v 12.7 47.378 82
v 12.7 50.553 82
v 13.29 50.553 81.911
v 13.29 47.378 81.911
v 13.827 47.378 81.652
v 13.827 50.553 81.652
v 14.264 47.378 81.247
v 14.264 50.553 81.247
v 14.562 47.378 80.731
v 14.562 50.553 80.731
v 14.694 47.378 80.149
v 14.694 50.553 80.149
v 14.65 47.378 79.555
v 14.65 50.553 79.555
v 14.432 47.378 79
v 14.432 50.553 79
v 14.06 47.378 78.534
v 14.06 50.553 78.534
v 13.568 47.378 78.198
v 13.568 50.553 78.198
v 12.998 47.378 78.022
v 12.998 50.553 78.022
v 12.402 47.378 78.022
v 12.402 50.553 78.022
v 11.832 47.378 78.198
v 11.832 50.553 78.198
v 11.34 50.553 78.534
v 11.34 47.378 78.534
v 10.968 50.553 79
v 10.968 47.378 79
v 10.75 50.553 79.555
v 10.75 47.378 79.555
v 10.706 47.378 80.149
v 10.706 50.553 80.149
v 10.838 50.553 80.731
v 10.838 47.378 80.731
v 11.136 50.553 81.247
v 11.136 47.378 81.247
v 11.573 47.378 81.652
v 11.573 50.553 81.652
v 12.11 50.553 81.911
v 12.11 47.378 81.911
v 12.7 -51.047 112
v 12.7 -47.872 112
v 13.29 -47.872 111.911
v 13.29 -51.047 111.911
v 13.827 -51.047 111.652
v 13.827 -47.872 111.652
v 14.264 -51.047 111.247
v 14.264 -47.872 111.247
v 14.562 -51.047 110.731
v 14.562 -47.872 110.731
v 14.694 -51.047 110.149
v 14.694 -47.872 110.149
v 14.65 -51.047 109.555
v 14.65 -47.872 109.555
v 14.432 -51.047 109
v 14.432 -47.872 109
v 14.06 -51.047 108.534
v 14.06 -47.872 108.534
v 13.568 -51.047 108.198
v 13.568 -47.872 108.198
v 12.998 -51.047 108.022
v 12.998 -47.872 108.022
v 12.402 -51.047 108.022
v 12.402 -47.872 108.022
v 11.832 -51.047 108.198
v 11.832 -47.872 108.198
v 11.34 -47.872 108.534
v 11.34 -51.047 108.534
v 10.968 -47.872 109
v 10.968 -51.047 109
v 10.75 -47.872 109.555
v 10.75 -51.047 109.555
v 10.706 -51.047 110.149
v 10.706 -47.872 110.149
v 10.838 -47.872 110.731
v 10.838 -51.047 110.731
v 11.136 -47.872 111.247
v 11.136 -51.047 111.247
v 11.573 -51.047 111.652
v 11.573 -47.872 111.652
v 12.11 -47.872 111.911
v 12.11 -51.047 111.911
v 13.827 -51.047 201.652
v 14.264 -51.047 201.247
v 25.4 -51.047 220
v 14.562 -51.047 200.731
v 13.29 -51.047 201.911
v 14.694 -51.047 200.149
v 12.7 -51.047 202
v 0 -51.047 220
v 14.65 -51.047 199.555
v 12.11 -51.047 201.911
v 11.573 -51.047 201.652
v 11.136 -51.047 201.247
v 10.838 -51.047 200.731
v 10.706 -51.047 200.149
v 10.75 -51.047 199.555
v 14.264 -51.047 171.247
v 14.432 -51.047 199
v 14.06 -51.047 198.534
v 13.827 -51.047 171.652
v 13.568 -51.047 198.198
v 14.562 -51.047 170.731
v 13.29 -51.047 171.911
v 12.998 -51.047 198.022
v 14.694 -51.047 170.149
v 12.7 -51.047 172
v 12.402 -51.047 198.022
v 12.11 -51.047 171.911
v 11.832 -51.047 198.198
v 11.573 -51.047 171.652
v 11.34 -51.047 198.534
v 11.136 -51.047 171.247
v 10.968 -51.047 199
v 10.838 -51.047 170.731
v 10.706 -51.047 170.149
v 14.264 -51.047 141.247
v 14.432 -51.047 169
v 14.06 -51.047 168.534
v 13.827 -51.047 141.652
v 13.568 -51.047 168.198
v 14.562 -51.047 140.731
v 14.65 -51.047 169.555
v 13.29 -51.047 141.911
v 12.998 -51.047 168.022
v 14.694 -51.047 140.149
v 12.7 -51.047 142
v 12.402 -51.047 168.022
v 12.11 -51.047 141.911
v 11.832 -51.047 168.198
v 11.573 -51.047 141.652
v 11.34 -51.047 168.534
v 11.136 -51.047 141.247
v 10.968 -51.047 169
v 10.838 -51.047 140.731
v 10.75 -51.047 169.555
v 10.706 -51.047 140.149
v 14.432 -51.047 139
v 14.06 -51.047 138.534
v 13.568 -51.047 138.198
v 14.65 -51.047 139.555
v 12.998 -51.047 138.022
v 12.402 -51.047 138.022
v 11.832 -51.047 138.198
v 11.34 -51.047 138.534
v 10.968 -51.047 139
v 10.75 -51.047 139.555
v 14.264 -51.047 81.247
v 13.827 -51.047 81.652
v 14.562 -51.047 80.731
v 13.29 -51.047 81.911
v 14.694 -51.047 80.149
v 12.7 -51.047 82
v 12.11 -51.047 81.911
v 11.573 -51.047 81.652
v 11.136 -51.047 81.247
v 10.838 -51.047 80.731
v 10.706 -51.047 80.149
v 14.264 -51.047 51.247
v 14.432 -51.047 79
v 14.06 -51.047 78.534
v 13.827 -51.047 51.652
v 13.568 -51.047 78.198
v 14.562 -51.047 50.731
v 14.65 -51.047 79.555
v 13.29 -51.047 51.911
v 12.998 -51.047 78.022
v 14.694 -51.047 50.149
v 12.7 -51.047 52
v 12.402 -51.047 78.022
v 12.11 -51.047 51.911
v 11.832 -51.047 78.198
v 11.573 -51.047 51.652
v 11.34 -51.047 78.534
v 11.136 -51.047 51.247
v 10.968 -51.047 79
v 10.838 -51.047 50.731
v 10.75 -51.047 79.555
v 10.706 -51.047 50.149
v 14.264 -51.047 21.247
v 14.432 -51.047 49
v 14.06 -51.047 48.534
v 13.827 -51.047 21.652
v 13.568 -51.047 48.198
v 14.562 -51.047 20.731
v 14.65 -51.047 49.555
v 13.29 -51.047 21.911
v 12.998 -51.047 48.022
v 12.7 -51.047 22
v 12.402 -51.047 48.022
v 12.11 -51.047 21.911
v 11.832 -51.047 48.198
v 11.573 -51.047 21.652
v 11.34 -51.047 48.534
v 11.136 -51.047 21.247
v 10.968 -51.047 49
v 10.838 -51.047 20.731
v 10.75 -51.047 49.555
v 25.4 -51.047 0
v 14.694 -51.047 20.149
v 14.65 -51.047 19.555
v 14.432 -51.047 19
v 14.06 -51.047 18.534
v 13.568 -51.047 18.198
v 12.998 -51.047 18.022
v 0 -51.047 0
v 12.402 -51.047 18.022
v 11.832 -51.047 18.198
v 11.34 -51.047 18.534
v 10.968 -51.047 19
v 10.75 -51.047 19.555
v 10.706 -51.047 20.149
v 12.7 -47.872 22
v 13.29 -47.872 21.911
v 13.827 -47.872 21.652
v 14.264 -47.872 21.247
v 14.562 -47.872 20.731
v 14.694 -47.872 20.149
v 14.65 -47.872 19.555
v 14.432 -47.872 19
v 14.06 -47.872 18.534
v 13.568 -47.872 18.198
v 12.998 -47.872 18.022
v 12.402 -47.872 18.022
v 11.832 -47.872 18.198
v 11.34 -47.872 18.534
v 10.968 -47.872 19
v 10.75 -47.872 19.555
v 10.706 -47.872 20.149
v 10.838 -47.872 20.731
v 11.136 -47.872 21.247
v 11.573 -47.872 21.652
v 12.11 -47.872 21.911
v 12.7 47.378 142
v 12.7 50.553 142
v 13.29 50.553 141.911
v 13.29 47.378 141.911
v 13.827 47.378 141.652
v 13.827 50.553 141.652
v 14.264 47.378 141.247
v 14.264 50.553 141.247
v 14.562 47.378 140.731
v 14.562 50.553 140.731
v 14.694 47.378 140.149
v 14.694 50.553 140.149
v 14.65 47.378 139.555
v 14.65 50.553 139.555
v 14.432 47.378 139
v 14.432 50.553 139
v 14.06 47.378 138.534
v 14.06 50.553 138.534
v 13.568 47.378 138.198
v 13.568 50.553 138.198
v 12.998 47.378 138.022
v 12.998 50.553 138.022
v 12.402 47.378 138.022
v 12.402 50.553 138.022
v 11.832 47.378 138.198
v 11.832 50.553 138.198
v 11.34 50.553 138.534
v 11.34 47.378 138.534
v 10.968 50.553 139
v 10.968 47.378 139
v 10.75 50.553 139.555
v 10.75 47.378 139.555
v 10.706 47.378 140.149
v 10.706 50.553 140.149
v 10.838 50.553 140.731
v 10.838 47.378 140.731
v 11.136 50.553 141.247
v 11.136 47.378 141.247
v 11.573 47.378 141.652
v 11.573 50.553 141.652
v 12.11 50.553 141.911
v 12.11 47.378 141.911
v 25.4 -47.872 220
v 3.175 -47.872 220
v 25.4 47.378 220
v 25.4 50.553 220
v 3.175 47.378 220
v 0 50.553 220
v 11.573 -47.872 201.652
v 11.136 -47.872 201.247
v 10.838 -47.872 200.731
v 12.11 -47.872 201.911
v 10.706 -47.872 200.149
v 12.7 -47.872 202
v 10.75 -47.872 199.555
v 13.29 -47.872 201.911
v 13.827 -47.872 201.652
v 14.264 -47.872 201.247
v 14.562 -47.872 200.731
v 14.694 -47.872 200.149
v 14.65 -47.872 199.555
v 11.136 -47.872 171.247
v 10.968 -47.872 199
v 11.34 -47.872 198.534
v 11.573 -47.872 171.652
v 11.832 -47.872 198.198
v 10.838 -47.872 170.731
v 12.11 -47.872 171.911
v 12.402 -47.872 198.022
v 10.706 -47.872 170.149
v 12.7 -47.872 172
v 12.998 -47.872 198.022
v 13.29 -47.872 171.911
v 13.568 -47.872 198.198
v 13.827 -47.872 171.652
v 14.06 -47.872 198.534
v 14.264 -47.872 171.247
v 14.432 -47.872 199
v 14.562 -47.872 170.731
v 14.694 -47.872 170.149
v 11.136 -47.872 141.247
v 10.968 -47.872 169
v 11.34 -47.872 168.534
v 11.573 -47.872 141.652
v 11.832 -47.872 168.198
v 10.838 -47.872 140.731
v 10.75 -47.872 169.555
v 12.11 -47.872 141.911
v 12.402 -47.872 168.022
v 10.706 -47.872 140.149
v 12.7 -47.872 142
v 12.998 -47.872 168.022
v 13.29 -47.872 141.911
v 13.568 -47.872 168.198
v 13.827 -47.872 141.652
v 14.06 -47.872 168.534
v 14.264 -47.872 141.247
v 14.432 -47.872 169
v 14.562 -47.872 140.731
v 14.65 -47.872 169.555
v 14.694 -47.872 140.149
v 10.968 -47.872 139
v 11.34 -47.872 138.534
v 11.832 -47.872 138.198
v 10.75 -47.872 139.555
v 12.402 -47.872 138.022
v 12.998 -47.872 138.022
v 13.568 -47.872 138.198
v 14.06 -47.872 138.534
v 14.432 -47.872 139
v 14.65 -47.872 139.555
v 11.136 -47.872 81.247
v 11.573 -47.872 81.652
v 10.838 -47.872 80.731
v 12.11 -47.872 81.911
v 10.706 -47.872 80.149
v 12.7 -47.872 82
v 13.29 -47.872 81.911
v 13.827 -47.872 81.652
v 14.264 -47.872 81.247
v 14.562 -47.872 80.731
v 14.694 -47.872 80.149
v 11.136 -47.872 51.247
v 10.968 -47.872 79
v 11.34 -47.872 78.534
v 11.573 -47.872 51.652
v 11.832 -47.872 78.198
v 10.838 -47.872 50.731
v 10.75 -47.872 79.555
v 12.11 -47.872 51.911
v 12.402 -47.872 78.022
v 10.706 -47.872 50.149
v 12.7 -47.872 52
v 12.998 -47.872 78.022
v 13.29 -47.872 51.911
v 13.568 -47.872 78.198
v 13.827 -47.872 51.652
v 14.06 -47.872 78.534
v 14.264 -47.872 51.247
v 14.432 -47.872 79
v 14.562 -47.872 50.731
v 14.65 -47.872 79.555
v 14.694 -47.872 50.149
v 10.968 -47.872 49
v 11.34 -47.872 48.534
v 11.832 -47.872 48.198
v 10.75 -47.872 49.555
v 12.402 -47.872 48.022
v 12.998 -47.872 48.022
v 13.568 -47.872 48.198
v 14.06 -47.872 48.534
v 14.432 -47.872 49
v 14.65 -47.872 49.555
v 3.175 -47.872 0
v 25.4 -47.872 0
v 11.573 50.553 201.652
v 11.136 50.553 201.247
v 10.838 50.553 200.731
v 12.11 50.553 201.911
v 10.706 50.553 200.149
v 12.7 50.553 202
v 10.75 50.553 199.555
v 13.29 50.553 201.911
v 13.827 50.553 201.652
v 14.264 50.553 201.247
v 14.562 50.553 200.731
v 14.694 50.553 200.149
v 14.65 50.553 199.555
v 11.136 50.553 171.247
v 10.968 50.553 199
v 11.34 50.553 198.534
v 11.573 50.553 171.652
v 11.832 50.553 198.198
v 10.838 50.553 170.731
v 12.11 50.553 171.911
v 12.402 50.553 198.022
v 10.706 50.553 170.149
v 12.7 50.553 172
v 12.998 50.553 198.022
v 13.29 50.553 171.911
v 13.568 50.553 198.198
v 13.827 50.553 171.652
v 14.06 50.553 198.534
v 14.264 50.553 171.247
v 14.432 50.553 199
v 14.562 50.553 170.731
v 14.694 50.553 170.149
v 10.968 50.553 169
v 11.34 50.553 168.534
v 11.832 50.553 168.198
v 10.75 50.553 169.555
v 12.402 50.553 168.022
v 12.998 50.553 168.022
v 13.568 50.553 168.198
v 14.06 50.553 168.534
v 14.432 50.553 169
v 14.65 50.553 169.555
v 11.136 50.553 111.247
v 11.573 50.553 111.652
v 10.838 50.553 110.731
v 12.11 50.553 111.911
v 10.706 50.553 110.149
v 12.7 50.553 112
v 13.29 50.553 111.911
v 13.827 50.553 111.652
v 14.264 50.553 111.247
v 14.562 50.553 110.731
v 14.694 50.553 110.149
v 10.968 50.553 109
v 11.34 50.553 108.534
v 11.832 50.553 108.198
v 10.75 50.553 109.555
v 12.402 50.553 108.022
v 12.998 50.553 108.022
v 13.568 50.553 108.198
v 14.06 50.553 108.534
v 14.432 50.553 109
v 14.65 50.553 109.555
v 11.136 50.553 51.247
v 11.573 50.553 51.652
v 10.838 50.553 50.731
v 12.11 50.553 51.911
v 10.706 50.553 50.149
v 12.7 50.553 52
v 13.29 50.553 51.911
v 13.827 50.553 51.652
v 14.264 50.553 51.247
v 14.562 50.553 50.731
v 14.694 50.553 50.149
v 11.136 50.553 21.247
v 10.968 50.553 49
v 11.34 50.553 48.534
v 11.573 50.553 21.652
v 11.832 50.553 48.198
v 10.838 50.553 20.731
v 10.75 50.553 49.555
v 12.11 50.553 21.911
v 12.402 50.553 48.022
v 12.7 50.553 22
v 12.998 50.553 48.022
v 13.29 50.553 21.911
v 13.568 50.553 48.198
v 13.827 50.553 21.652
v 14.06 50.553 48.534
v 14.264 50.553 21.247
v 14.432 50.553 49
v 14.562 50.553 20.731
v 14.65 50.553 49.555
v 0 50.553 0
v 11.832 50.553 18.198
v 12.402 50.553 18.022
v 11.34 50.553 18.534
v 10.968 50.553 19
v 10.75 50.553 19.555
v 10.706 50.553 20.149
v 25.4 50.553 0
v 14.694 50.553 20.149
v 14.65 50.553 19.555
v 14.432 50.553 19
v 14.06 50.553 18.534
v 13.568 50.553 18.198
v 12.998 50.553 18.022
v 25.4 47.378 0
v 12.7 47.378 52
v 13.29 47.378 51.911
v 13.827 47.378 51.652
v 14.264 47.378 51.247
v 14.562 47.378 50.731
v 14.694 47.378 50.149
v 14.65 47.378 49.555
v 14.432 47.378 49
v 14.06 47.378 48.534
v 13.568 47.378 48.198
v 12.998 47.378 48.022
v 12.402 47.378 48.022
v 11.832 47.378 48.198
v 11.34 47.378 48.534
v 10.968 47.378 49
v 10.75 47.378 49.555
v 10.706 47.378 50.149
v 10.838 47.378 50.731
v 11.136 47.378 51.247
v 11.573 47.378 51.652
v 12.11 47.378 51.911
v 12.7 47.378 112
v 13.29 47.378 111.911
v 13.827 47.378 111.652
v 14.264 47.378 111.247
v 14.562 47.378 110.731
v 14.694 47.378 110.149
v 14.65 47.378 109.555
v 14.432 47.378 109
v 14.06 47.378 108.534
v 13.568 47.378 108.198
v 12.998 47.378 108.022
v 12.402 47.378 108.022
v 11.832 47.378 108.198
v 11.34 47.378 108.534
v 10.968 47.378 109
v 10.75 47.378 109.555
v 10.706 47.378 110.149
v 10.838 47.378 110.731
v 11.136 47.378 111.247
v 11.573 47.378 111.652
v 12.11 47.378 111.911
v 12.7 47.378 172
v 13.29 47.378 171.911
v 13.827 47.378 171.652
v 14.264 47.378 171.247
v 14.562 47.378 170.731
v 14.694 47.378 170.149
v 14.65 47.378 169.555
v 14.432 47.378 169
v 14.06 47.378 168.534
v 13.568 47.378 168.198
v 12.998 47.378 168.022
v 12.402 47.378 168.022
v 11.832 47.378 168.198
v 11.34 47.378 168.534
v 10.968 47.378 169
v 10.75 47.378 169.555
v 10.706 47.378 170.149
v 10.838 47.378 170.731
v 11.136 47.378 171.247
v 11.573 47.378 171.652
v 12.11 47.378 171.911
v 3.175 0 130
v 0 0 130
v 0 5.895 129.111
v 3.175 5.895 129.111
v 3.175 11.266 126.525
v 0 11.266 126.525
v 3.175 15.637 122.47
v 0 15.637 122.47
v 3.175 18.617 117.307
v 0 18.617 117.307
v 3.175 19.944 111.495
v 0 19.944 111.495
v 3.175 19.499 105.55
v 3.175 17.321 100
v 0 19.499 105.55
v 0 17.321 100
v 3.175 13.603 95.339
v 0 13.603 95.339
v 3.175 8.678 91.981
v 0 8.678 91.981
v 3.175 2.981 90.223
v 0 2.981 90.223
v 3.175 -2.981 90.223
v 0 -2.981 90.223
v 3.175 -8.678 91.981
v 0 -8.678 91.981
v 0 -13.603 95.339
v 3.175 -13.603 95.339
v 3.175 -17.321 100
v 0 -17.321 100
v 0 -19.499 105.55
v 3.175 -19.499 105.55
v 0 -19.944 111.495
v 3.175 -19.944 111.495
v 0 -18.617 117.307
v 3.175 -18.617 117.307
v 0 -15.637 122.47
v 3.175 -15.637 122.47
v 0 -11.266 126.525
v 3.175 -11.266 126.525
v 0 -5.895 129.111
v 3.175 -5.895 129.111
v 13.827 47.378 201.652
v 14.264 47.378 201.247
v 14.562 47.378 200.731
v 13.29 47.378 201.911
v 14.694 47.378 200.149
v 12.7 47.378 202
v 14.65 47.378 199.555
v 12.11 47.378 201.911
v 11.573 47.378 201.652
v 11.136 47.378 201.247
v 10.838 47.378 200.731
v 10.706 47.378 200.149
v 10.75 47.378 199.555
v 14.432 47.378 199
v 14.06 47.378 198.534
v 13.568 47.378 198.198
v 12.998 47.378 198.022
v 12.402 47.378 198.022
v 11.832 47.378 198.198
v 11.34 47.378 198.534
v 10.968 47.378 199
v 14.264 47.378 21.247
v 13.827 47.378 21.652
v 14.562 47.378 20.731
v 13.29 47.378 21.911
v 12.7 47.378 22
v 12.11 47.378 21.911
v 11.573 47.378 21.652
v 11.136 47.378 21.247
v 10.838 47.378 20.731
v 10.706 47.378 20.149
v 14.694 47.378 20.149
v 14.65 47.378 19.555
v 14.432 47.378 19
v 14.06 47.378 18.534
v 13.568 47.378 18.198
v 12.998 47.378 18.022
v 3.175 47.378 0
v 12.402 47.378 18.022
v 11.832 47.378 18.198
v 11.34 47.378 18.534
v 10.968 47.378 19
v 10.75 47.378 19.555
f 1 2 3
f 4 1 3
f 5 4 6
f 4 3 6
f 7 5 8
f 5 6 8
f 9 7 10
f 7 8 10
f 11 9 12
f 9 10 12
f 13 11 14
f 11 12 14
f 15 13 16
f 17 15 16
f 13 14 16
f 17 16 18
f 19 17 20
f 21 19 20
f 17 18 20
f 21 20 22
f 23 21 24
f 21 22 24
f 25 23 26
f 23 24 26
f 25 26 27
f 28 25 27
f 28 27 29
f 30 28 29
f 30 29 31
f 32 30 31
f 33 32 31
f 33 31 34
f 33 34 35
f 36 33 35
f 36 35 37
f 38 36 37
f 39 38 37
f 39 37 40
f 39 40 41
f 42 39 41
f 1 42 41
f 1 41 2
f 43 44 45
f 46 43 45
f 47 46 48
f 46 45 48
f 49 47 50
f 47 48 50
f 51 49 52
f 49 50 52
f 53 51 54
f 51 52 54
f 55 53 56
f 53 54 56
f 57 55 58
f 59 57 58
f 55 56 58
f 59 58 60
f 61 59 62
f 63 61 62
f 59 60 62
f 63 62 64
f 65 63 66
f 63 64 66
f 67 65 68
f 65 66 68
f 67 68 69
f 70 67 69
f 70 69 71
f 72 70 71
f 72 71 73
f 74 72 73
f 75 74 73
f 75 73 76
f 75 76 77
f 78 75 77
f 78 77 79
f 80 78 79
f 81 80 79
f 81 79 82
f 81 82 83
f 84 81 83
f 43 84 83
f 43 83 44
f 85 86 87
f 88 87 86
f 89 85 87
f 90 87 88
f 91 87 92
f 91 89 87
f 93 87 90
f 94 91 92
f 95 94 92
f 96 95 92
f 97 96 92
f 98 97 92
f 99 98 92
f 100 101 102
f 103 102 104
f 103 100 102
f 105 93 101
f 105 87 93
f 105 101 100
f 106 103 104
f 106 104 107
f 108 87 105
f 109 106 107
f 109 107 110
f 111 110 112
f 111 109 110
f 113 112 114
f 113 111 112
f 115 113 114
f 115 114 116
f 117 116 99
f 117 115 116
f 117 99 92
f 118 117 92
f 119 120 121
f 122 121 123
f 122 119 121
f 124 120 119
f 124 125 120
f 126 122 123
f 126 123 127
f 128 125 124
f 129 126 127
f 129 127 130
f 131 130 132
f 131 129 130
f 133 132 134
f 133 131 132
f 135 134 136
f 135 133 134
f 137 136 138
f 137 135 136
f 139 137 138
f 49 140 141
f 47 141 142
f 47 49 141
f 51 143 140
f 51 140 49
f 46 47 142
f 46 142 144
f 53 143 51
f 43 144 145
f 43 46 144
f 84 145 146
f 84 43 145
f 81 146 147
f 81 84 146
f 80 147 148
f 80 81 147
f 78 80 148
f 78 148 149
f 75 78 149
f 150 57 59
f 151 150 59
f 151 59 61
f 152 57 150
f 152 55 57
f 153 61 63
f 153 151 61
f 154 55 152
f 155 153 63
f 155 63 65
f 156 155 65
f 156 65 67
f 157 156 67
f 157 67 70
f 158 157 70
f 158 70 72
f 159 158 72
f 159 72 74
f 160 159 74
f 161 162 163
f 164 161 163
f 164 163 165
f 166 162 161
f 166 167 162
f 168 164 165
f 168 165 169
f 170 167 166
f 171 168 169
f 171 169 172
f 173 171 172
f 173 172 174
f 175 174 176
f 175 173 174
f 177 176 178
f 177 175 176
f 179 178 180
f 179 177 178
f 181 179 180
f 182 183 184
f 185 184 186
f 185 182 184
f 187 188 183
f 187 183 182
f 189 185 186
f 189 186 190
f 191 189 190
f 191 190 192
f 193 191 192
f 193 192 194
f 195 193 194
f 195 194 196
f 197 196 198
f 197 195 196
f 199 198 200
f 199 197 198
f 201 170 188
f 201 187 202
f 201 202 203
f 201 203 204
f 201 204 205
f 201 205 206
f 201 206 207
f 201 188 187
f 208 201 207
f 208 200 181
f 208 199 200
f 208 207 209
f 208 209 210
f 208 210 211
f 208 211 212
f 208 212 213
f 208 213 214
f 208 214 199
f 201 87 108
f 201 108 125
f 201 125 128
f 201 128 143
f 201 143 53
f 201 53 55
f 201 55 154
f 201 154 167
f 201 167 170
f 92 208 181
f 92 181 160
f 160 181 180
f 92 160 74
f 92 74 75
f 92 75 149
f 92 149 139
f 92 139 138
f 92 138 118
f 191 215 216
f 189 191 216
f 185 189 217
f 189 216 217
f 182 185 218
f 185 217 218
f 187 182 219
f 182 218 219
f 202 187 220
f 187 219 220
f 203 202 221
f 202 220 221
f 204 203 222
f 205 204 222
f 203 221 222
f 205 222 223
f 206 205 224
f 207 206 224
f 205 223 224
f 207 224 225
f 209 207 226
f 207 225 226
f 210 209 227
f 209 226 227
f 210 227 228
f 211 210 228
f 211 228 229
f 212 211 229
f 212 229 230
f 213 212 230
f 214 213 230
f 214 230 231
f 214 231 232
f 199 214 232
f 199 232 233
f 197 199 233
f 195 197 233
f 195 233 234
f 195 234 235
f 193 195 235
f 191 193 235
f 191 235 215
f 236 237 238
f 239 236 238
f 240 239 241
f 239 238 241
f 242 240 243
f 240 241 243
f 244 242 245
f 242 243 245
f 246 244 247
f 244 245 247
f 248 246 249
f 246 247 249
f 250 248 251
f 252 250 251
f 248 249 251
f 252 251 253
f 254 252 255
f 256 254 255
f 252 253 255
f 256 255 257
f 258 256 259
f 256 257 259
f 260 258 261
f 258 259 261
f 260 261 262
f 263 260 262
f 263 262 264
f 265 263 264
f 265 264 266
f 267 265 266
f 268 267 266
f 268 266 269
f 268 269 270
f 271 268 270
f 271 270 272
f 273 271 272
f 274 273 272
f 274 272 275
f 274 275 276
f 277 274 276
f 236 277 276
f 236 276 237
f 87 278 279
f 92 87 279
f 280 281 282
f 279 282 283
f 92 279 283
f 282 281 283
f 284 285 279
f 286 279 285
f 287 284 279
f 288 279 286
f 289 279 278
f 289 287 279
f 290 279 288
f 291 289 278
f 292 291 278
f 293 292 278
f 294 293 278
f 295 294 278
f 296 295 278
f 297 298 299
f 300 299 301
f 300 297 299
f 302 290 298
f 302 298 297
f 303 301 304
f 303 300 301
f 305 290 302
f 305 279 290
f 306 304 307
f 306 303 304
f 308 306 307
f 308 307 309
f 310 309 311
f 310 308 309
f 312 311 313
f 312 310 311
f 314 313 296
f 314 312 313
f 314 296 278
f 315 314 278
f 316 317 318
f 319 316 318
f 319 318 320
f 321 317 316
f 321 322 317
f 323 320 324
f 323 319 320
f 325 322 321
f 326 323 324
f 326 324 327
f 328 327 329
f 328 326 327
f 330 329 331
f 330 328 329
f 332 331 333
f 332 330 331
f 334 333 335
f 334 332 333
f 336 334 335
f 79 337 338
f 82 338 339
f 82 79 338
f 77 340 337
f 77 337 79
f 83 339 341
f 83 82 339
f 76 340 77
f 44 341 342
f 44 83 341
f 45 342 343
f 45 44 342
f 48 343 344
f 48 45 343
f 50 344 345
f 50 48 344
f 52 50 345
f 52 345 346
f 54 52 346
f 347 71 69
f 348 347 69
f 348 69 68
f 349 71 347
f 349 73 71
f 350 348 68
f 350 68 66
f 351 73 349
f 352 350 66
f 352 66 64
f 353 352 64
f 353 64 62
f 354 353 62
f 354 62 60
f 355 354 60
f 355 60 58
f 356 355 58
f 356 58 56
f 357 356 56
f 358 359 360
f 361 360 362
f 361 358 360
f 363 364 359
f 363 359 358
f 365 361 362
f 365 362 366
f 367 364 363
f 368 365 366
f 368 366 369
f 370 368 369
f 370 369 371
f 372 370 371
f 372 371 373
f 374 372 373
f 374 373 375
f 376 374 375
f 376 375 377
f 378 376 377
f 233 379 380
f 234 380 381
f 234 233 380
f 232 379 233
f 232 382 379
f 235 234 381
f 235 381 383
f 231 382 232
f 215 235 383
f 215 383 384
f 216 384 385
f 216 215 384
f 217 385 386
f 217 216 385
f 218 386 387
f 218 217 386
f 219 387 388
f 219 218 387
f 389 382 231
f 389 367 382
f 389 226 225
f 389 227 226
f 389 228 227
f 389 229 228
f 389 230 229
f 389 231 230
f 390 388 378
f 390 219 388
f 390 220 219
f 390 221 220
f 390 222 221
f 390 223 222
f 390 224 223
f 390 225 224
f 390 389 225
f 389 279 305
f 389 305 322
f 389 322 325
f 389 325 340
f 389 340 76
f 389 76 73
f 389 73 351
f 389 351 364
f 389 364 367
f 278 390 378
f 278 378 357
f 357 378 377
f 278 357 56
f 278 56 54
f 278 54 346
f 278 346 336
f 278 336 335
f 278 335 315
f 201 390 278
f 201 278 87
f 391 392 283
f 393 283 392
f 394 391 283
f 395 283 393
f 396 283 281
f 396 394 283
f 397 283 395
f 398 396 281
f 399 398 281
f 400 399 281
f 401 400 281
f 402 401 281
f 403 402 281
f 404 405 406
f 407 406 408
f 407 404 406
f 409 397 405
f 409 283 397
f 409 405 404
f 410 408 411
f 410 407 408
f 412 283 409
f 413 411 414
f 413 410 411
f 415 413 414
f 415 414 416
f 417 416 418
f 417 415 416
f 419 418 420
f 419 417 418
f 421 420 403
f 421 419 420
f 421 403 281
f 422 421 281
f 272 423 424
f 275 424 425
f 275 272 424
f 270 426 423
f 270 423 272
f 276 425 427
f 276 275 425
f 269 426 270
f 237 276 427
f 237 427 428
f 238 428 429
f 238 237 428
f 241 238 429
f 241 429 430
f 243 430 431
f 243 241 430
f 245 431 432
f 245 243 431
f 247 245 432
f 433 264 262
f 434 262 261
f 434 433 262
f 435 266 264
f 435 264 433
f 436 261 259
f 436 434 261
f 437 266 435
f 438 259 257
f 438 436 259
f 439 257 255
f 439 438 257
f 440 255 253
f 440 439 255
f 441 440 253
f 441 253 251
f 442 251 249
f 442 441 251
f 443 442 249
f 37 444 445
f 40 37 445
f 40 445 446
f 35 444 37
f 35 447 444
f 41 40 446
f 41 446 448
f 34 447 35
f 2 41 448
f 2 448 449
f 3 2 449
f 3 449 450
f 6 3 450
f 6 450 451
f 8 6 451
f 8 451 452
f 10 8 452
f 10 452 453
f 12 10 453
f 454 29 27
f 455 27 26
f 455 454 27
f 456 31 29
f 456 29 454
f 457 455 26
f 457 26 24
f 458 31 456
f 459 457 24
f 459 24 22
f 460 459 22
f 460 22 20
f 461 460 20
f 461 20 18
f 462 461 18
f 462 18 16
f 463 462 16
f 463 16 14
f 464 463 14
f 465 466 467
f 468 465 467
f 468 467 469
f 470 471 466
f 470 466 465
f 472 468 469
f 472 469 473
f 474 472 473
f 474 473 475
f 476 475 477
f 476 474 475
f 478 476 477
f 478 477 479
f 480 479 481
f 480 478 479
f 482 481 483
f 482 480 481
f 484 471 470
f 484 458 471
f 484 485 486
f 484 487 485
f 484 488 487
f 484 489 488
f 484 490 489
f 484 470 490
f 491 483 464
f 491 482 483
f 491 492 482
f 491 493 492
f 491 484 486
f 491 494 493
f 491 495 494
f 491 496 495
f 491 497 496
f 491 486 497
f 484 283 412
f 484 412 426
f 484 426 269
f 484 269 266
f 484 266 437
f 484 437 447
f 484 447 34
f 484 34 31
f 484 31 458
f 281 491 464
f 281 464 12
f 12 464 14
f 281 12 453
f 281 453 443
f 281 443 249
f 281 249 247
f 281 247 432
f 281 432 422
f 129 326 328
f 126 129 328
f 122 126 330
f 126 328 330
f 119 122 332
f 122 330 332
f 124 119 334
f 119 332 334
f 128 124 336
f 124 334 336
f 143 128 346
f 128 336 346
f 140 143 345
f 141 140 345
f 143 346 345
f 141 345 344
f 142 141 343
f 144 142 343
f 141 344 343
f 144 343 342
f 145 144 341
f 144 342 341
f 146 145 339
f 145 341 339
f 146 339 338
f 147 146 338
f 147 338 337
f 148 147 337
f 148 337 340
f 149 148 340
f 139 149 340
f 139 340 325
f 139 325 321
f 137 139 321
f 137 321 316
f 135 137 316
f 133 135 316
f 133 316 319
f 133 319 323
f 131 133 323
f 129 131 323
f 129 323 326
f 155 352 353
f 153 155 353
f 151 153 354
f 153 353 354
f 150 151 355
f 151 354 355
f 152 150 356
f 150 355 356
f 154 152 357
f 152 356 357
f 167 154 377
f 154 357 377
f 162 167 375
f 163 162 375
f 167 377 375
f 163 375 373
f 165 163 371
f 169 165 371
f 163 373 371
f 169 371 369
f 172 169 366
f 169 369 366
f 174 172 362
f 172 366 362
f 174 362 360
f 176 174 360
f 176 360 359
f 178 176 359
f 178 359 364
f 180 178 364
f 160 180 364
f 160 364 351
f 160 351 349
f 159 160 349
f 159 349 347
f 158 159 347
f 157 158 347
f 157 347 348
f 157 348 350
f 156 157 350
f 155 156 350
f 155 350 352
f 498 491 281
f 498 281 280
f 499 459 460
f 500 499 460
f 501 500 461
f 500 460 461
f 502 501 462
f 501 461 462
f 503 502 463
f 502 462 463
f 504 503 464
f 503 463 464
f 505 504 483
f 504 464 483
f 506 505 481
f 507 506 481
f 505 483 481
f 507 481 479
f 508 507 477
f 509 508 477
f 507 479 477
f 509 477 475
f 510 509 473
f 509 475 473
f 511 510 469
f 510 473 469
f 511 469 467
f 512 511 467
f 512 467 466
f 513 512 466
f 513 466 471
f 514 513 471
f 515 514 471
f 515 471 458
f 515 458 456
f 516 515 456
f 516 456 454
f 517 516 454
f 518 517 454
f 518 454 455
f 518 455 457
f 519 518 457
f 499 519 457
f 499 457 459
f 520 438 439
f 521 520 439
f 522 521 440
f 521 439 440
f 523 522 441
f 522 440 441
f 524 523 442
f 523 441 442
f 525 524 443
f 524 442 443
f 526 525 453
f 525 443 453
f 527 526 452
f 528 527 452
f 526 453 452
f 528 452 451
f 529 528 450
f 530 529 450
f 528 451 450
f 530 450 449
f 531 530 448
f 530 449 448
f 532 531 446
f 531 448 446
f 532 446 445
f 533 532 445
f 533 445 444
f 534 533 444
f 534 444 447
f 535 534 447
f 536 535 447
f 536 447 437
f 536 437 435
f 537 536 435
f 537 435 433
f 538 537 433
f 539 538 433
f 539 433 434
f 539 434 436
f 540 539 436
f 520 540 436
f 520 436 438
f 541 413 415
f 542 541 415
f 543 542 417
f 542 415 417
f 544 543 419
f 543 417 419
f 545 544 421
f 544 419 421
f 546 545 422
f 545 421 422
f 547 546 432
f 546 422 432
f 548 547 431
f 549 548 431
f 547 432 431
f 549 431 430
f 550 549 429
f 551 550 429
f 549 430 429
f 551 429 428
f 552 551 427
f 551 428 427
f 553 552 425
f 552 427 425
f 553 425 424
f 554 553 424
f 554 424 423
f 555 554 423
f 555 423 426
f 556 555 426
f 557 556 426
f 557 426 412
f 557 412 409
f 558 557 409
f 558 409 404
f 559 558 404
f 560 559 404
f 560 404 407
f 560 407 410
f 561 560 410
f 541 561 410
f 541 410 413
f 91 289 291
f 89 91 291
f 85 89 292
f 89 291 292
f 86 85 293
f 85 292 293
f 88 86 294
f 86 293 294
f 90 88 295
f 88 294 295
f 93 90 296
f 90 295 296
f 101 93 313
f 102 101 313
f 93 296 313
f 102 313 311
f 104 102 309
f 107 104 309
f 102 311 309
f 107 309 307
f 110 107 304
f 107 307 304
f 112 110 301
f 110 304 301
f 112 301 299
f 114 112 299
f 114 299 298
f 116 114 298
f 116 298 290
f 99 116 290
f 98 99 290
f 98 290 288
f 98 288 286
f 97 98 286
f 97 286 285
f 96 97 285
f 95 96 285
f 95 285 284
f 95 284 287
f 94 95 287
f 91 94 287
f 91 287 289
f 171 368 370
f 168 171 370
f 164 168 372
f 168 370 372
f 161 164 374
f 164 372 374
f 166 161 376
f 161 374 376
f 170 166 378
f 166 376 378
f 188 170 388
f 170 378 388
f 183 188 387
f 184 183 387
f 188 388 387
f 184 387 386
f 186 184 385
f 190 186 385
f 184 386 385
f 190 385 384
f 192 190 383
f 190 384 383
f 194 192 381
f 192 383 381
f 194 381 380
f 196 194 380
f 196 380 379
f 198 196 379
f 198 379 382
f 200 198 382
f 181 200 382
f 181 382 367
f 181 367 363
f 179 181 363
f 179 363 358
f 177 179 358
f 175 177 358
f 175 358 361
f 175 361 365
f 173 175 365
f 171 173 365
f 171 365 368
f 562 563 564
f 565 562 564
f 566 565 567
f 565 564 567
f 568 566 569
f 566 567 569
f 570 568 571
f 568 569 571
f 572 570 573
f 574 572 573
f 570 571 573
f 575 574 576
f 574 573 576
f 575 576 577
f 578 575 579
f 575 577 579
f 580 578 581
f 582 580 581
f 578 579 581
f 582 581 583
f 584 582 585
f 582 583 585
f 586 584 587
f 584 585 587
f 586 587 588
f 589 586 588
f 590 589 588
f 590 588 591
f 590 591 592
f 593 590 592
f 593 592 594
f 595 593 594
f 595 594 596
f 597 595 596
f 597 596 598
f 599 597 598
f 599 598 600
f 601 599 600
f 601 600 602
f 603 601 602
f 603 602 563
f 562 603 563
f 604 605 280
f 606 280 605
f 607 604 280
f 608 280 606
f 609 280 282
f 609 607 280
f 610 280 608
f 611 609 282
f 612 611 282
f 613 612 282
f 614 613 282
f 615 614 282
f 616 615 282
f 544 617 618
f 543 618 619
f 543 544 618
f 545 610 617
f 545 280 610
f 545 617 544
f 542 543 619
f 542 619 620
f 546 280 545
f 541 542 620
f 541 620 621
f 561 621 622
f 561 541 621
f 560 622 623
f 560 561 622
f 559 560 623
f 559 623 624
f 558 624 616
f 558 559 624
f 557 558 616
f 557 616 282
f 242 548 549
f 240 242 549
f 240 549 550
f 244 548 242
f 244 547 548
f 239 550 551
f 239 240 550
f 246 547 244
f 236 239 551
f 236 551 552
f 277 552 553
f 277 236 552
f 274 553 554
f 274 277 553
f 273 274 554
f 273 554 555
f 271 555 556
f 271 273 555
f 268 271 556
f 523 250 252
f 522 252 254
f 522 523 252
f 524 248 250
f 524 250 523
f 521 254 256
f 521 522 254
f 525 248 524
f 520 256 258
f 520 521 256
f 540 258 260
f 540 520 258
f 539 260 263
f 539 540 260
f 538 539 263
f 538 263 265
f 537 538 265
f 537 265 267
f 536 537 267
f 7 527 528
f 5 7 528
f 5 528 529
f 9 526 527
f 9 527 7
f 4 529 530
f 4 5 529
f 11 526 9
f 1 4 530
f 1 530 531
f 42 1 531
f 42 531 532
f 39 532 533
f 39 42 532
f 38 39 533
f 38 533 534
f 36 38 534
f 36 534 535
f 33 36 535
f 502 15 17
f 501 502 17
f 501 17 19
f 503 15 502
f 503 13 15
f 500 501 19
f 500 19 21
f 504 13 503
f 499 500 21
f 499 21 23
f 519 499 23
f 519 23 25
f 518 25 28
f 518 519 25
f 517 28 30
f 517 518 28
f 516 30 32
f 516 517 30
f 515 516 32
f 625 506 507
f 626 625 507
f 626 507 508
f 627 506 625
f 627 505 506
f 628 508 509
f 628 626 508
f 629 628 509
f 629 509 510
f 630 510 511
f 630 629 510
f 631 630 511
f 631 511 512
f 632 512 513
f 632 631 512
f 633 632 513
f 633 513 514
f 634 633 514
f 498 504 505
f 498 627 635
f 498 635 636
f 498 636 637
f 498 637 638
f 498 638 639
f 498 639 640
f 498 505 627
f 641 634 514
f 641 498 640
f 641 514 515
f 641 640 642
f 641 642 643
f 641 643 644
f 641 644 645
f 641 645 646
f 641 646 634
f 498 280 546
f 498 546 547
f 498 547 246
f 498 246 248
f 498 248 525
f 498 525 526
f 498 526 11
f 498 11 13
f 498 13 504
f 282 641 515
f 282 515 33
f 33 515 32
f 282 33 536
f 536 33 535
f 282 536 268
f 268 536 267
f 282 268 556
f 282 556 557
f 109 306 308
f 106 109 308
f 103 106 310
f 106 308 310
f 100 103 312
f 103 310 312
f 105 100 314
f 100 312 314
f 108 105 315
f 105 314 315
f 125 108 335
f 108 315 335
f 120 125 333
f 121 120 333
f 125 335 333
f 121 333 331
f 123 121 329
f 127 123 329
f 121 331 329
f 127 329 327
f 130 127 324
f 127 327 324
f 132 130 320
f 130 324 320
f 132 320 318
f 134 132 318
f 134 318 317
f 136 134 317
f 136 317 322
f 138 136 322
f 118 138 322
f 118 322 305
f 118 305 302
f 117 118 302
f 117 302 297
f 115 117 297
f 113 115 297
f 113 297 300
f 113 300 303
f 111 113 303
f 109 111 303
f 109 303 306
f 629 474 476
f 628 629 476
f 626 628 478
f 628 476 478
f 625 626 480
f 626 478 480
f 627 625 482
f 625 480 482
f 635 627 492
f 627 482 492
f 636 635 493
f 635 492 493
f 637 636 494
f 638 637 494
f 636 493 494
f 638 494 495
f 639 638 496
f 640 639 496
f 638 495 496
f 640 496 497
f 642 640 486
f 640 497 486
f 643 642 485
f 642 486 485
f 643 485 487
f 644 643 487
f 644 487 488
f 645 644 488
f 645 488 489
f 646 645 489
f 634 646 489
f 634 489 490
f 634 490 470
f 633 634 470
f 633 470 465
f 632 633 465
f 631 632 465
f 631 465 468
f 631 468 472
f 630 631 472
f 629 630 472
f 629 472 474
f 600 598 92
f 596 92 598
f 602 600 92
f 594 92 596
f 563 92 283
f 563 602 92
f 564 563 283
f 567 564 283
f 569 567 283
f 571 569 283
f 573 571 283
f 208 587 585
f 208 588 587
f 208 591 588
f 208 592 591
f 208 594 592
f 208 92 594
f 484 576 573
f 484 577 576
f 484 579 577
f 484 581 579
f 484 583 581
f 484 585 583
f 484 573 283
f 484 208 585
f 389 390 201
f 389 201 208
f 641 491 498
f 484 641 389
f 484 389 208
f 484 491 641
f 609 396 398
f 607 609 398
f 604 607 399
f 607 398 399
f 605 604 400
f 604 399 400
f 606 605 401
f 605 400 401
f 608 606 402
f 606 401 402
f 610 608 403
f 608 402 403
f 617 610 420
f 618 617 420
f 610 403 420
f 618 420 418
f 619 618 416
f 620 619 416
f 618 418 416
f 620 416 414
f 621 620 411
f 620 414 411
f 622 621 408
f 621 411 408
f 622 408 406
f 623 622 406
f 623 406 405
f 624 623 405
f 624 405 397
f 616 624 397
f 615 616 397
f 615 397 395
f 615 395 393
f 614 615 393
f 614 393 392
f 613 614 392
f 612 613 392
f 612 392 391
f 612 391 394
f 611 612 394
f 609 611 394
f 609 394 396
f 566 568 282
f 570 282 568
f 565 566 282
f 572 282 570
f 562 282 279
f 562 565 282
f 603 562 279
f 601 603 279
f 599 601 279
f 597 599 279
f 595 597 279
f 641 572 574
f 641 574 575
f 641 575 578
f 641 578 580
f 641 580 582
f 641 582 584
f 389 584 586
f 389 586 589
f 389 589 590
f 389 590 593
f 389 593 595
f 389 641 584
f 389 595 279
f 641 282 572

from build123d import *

# Parameters (mm, degrees)
BOSS_EXTRUDE1_DEPTH = 220
CUT_EXTRUDE1_REACH  = 245.655
SKETCH2_R           = 2
SKETCH3_R           = 20
CUT_EXTRUDE2_DEPTH  = 220


with BuildPart() as part:
    # Sketch1 → Boss-Extrude1 (new body)
    with BuildSketch(Plane.XY):
        Polygon((0, -51.046601942), (0, 50.553398058), (25.4, 50.553398058), (25.4, 47.378398058), (3.175, 47.378398058), (3.175, -47.871601942), (25.4, -47.871601942), (25.4, -51.046601942), align=None)
    extrude(amount=BOSS_EXTRUDE1_DEPTH)

    # Cut-Extrude1: up to this face of the body (flat: up to its plane)
    cut_extrude1_end = Plane(part.part.faces().sort_by_distance((12.7, -51.046601942, 110))[0])
    # Sketch2 → Cut-Extrude1 (cut, up to the picked face)
    with BuildSketch(Plane(origin=(0, 50.553398058, 0), x_dir=(1, 0, 0), z_dir=(0, 1, 0)), mode=Mode.PRIVATE) as cut_extrude1_sk1:
        with Locations(Location((12.7, -110, 0), (0, 0, 270))):
            Circle(SKETCH2_R)
    cut_extrude1_tool1 = split(extrude(cut_extrude1_sk1.sketch, amount=-CUT_EXTRUDE1_REACH, mode=Mode.PRIVATE), bisect_by=cut_extrude1_end, keep=Keep.BOTH, mode=Mode.PRIVATE)
    # Sketch2 → Cut-Extrude1 (cut, up to the picked face)
    with BuildSketch(Plane(origin=(0, 50.553398058, 0), x_dir=(1, 0, 0), z_dir=(0, 1, 0)), mode=Mode.PRIVATE) as cut_extrude1_sk2:
        with Locations(Location((12.7, -80, 0), (0, 0, 270))):
            Circle(SKETCH2_R)
    cut_extrude1_tool2 = split(extrude(cut_extrude1_sk2.sketch, amount=-CUT_EXTRUDE1_REACH, mode=Mode.PRIVATE), bisect_by=cut_extrude1_end, keep=Keep.BOTH, mode=Mode.PRIVATE)
    # Sketch2 → Cut-Extrude1 (cut, up to the picked face)
    with BuildSketch(Plane(origin=(0, 50.553398058, 0), x_dir=(1, 0, 0), z_dir=(0, 1, 0)), mode=Mode.PRIVATE) as cut_extrude1_sk3:
        with Locations(Location((12.7, -50, 0), (0, 0, 270))):
            Circle(SKETCH2_R)
    cut_extrude1_tool3 = split(extrude(cut_extrude1_sk3.sketch, amount=-CUT_EXTRUDE1_REACH, mode=Mode.PRIVATE), bisect_by=cut_extrude1_end, keep=Keep.BOTH, mode=Mode.PRIVATE)
    # Sketch2 → Cut-Extrude1 (cut, up to the picked face)
    with BuildSketch(Plane(origin=(0, 50.553398058, 0), x_dir=(1, 0, 0), z_dir=(0, 1, 0)), mode=Mode.PRIVATE) as cut_extrude1_sk4:
        with Locations(Location((12.7, -20, 0), (0, 0, 270))):
            Circle(SKETCH2_R)
    cut_extrude1_tool4 = split(extrude(cut_extrude1_sk4.sketch, amount=-CUT_EXTRUDE1_REACH, mode=Mode.PRIVATE), bisect_by=cut_extrude1_end, keep=Keep.BOTH, mode=Mode.PRIVATE)
    # Sketch2 → Cut-Extrude1 (cut, up to the picked face)
    with BuildSketch(Plane(origin=(0, 50.553398058, 0), x_dir=(1, 0, 0), z_dir=(0, 1, 0)), mode=Mode.PRIVATE) as cut_extrude1_sk5:
        with Locations(Location((12.7, -140, 0), (0, 0, 270))):
            Circle(SKETCH2_R)
    cut_extrude1_tool5 = split(extrude(cut_extrude1_sk5.sketch, amount=-CUT_EXTRUDE1_REACH, mode=Mode.PRIVATE), bisect_by=cut_extrude1_end, keep=Keep.BOTH, mode=Mode.PRIVATE)
    # Sketch2 → Cut-Extrude1 (cut, up to the picked face)
    with BuildSketch(Plane(origin=(0, 50.553398058, 0), x_dir=(1, 0, 0), z_dir=(0, 1, 0)), mode=Mode.PRIVATE) as cut_extrude1_sk6:
        with Locations(Location((12.7, -170, 0), (0, 0, 270))):
            Circle(SKETCH2_R)
    cut_extrude1_tool6 = split(extrude(cut_extrude1_sk6.sketch, amount=-CUT_EXTRUDE1_REACH, mode=Mode.PRIVATE), bisect_by=cut_extrude1_end, keep=Keep.BOTH, mode=Mode.PRIVATE)
    # Sketch2 → Cut-Extrude1 (cut, up to the picked face)
    with BuildSketch(Plane(origin=(0, 50.553398058, 0), x_dir=(1, 0, 0), z_dir=(0, 1, 0)), mode=Mode.PRIVATE) as cut_extrude1_sk7:
        with Locations(Location((12.7, -200, 0), (0, 0, 270))):
            Circle(SKETCH2_R)
    cut_extrude1_tool7 = split(extrude(cut_extrude1_sk7.sketch, amount=-CUT_EXTRUDE1_REACH, mode=Mode.PRIVATE), bisect_by=cut_extrude1_end, keep=Keep.BOTH, mode=Mode.PRIVATE)
    add(cut_extrude1_tool1.solids().sort_by(Axis((12.7, 50.553398, 110), (0, -1, 0)))[0], mode=Mode.SUBTRACT)
    add(cut_extrude1_tool2.solids().sort_by(Axis((12.7, 50.553398, 80), (0, -1, 0)))[0], mode=Mode.SUBTRACT)
    add(cut_extrude1_tool3.solids().sort_by(Axis((12.7, 50.553398, 50), (0, -1, 0)))[0], mode=Mode.SUBTRACT)
    add(cut_extrude1_tool4.solids().sort_by(Axis((12.7, 50.553398, 20), (0, -1, 0)))[0], mode=Mode.SUBTRACT)
    add(cut_extrude1_tool5.solids().sort_by(Axis((12.7, 50.553398, 140), (0, -1, 0)))[0], mode=Mode.SUBTRACT)
    add(cut_extrude1_tool6.solids().sort_by(Axis((12.7, 50.553398, 170), (0, -1, 0)))[0], mode=Mode.SUBTRACT)
    add(cut_extrude1_tool7.solids().sort_by(Axis((12.7, 50.553398, 200), (0, -1, 0)))[0], mode=Mode.SUBTRACT)

    # Sketch3 → Cut-Extrude2 (cut)
    with BuildSketch(Plane.ZY):
        with Locations((110, 0)):
            Circle(SKETCH3_R)
    extrude(amount=-CUT_EXTRUDE2_DEPTH, mode=Mode.SUBTRACT)


solid = part.part
